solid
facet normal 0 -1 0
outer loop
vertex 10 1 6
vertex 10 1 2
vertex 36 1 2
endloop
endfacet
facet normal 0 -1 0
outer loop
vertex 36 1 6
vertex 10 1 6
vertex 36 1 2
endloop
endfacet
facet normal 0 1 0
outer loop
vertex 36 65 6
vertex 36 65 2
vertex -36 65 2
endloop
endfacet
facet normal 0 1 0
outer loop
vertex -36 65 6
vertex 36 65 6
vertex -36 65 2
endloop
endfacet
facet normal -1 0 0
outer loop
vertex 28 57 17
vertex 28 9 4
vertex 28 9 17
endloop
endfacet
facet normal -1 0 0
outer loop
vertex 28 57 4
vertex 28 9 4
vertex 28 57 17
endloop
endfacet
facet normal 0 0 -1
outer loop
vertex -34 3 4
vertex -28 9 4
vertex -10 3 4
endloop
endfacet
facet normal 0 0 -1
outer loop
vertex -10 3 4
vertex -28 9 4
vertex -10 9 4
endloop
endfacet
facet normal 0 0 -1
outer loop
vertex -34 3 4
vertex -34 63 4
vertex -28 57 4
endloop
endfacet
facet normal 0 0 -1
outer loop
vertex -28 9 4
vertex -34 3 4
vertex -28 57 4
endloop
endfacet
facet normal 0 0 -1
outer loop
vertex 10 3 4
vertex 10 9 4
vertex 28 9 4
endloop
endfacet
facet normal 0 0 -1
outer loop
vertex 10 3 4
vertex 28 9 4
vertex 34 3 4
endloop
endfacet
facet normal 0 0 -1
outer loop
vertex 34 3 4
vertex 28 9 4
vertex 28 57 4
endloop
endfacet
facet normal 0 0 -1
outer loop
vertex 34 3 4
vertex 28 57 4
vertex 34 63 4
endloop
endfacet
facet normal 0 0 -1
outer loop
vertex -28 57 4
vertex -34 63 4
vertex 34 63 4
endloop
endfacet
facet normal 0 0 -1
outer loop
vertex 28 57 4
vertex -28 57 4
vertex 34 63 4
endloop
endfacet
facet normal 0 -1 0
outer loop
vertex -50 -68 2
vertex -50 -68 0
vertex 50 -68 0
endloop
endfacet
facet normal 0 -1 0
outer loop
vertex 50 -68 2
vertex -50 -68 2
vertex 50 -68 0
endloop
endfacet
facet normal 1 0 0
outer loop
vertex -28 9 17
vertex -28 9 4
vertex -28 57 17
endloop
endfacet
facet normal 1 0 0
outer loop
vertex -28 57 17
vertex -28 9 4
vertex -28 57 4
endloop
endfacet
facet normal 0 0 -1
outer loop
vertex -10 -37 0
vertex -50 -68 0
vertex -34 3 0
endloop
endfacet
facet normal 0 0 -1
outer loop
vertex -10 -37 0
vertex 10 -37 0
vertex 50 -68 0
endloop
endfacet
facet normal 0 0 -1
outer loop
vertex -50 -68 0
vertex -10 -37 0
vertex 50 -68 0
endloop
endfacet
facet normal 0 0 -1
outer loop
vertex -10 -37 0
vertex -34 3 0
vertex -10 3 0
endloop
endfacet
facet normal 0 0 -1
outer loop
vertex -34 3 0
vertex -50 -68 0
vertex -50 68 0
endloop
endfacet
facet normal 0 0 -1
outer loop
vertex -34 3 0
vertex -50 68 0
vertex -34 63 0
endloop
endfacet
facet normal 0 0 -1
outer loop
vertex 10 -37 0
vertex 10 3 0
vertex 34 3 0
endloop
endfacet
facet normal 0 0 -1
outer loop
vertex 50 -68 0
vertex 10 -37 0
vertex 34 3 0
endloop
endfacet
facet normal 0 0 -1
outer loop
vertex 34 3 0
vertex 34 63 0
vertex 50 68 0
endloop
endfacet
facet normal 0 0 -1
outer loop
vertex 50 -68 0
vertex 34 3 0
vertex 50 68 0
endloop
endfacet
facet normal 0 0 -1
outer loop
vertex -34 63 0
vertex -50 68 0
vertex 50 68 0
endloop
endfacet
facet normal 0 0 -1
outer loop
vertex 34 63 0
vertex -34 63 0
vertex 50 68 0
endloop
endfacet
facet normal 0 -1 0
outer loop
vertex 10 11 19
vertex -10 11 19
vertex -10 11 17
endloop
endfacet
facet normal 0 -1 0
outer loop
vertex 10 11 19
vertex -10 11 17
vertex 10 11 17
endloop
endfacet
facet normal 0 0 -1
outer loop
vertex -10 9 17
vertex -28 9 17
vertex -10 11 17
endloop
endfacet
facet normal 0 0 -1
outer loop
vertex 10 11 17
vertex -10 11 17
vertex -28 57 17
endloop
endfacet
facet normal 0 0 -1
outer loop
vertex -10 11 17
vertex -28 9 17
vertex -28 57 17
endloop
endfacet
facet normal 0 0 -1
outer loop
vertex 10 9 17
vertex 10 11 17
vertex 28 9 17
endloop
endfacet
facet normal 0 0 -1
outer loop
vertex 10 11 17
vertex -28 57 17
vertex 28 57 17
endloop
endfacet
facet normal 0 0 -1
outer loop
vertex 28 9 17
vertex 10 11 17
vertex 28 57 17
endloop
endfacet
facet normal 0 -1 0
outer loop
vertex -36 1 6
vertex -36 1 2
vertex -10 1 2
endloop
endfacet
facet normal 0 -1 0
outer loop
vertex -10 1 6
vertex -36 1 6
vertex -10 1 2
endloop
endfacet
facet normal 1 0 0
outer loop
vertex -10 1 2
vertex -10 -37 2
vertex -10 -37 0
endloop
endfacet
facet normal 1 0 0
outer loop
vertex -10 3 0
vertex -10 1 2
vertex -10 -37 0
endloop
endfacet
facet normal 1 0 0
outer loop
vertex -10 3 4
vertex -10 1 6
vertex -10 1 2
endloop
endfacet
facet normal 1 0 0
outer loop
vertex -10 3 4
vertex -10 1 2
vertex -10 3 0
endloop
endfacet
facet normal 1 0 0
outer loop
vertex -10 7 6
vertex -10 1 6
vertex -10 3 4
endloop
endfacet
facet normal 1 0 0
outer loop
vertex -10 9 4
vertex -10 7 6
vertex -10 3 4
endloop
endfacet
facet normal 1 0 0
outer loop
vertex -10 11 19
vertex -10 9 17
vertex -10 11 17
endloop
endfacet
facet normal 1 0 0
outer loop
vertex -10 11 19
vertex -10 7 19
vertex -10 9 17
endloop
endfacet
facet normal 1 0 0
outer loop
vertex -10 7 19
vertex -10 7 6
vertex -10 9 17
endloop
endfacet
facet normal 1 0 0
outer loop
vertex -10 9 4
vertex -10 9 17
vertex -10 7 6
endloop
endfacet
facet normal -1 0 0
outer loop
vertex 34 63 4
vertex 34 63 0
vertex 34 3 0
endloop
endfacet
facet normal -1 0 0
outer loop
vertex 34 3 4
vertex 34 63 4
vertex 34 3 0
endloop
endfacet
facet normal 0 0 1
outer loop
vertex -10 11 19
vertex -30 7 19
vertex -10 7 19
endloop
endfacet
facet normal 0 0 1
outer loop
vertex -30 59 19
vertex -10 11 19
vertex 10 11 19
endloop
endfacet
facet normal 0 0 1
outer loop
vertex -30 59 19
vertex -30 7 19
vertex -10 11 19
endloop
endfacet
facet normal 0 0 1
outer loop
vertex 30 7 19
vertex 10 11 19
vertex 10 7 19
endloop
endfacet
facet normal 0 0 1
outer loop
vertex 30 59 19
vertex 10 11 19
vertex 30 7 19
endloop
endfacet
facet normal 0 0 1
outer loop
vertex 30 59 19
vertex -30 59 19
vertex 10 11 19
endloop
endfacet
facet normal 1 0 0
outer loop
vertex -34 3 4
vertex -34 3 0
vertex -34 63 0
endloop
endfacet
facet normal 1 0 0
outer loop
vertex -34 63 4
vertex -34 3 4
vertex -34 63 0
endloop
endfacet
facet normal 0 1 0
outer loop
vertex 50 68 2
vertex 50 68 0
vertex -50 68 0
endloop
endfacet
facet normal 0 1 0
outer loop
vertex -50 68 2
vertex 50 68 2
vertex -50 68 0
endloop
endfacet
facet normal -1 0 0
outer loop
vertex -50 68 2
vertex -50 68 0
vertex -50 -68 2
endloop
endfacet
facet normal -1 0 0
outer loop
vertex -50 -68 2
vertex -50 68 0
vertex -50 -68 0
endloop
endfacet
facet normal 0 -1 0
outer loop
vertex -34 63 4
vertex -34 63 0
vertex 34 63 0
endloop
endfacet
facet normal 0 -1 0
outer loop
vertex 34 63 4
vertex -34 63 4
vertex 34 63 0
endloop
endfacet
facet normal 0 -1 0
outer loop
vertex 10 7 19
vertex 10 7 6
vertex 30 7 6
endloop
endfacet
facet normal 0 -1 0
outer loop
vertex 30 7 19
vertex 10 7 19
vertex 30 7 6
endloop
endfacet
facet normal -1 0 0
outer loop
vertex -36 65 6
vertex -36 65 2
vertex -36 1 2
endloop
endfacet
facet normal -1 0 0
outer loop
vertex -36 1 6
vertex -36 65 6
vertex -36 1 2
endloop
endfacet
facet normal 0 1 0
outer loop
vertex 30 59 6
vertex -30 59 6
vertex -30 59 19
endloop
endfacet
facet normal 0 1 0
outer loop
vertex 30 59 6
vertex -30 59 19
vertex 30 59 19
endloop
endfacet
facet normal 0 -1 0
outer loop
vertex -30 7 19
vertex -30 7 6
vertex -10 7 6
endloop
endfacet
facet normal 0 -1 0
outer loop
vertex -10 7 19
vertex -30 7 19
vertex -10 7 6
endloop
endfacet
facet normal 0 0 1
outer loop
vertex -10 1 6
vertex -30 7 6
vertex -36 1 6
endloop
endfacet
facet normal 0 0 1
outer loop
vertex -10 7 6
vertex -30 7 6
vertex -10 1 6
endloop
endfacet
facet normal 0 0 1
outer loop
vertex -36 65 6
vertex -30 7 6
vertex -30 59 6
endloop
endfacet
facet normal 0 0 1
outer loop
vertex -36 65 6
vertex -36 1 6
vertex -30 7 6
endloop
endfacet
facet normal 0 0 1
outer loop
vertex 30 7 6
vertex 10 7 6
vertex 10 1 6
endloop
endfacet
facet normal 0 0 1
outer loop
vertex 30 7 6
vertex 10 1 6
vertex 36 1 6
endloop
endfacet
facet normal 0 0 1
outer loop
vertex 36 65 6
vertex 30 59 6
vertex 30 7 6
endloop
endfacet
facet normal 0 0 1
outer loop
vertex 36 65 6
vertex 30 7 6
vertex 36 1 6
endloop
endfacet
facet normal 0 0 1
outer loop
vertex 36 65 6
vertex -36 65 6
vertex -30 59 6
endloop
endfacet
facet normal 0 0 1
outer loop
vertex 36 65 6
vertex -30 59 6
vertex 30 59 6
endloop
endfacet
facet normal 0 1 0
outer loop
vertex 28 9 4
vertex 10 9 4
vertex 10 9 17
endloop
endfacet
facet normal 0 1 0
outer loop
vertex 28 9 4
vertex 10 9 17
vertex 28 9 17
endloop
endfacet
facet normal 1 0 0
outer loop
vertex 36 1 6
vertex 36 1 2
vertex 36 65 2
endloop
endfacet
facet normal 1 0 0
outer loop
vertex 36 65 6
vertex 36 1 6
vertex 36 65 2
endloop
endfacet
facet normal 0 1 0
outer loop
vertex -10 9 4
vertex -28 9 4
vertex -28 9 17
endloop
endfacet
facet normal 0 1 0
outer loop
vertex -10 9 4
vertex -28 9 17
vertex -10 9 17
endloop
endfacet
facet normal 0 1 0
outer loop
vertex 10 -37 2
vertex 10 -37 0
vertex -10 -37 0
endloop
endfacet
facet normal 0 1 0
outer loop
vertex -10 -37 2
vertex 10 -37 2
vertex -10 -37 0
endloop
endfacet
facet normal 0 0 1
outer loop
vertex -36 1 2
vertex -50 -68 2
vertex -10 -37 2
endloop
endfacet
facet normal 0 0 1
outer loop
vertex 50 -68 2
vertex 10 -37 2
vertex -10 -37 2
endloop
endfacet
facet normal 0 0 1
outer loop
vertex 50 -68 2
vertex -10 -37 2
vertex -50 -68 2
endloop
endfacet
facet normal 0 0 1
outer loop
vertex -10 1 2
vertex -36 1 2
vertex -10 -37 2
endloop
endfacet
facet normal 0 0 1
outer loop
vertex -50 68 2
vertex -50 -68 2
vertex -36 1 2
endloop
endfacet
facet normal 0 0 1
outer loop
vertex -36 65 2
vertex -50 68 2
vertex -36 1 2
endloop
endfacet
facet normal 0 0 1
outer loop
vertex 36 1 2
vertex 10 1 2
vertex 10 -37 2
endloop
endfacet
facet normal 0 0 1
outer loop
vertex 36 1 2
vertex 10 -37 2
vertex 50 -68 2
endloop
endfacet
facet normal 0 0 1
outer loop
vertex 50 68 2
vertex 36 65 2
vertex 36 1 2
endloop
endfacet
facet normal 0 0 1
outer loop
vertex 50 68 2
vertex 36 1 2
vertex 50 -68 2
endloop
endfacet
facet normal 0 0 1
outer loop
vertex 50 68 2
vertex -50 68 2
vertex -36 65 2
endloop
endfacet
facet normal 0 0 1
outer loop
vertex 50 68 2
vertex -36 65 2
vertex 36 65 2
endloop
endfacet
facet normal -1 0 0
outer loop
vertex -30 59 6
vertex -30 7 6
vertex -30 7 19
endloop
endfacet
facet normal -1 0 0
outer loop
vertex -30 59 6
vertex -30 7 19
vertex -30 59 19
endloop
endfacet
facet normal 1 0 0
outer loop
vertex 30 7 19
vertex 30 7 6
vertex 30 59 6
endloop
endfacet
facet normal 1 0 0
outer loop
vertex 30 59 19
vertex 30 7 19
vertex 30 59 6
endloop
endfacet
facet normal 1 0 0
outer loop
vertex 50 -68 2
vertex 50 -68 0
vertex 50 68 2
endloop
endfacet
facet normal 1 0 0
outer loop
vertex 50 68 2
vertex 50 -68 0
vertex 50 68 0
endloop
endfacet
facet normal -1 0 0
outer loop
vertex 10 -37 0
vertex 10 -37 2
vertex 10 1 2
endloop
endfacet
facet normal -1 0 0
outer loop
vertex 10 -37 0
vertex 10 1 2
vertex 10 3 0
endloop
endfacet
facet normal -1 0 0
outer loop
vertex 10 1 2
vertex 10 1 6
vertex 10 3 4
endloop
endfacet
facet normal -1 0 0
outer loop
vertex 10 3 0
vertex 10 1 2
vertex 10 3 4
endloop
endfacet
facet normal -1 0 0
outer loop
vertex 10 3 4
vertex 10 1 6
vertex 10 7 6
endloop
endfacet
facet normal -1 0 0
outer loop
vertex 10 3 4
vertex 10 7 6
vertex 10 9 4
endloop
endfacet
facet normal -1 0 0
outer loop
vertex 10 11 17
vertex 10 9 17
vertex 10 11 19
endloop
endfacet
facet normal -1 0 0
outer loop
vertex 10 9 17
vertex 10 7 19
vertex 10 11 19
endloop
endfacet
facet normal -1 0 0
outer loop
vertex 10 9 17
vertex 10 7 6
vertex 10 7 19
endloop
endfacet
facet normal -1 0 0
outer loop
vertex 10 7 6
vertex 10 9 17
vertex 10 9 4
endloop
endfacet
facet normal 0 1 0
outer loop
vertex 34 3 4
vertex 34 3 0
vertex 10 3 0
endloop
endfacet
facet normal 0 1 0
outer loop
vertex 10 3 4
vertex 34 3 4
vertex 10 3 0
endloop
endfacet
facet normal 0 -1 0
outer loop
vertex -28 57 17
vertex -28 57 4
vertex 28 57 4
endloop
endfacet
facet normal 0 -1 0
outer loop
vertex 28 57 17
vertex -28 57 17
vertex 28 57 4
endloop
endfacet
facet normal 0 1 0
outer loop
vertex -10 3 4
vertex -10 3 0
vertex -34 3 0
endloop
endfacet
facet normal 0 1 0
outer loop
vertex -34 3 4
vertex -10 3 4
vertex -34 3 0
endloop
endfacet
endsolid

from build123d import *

# Parameters (mm, degrees)
BOSS_EXTRU_1_DEPTH      = 2
BOSS_EXTRU_2_DEPTH      = 4
ESQUISSE3_W             = 68
ESQUISSE3_H             = 60
ESQUISSE3_W_2           = 56
ESQUISSE3_H_2           = 48
BOSS_EXTRU_3_DEPTH      = 2
ESQUISSE4_W             = 60
ESQUISSE4_H             = 52
ESQUISSE4_W_2           = 56
ESQUISSE4_H_2           = 48
BOSS_EXTRU_4_DEPTH      = 13
ESQUISSE5_W             = 56
ESQUISSE5_H             = 48
BOSS_EXTRU_5_DEPTH      = 2
ESQUISSE6_W             = 20
ESQUISSE6_H             = 10
ENL_V_MAT_EXTRU_1_DEPTH = 35


with BuildPart() as part:
    # Esquisse1 → Boss.-Extru.1 (new body)
    with BuildSketch(Plane.XY):
        Polygon((-50, 68), (-50, -68), (-10, -68), (10, -68), (50, -68), (50, 68), align=None)
        Polygon((-10, 3), (-34, 3), (-34, 63), (34, 63), (34, 3), (10, 3), (10, -37), (-10, -37), align=None, mode=Mode.SUBTRACT)
    extrude(amount=BOSS_EXTRU_1_DEPTH)

    # Esquisse2 → Boss.-Extru.2 (add)
    with BuildSketch(Plane.XY.offset(2)):
        Polygon((36, 65), (-36, 65), (-36, 1), (-10, 1), (-10, 3), (-34, 3), (-34, 63), (34, 63), (34, 3), (10, 3), (10, 1), (36, 1), align=None)
    extrude(amount=BOSS_EXTRU_2_DEPTH)

    # Esquisse3 → Boss.-Extru.3 (add)
    with BuildSketch(Plane.XY.offset(6)):
        with Locations((0, 33)):
            Rectangle(ESQUISSE3_W, ESQUISSE3_H)
        with Locations((0, 33)):
            Rectangle(ESQUISSE3_W_2, ESQUISSE3_H_2, mode=Mode.SUBTRACT)
    extrude(amount=-BOSS_EXTRU_3_DEPTH)

    # Esquisse4 → Boss.-Extru.4 (add)
    with BuildSketch(Plane.XY.offset(6)):
        with Locations((0, 33)):
            Rectangle(ESQUISSE4_W, ESQUISSE4_H)
        with Locations((0, 33)):
            Rectangle(ESQUISSE4_W_2, ESQUISSE4_H_2, mode=Mode.SUBTRACT)
    extrude(amount=BOSS_EXTRU_4_DEPTH)

    # Esquisse5 → Boss.-Extru.5 (add)
    with BuildSketch(Plane.XY.offset(19)):
        with Locations((0, 33)):
            Rectangle(ESQUISSE5_W, ESQUISSE5_H)
    extrude(amount=-BOSS_EXTRU_5_DEPTH)

    # Esquisse6 → Enlèv. mat.-Extru.1 (cut)
    with BuildSketch(Plane.XY.offset(19)):
        with Locations((0, 6)):
            Rectangle(ESQUISSE6_W, ESQUISSE6_H)
    extrude(amount=-ENL_V_MAT_EXTRU_1_DEPTH, mode=Mode.SUBTRACT)


solid = part.part
